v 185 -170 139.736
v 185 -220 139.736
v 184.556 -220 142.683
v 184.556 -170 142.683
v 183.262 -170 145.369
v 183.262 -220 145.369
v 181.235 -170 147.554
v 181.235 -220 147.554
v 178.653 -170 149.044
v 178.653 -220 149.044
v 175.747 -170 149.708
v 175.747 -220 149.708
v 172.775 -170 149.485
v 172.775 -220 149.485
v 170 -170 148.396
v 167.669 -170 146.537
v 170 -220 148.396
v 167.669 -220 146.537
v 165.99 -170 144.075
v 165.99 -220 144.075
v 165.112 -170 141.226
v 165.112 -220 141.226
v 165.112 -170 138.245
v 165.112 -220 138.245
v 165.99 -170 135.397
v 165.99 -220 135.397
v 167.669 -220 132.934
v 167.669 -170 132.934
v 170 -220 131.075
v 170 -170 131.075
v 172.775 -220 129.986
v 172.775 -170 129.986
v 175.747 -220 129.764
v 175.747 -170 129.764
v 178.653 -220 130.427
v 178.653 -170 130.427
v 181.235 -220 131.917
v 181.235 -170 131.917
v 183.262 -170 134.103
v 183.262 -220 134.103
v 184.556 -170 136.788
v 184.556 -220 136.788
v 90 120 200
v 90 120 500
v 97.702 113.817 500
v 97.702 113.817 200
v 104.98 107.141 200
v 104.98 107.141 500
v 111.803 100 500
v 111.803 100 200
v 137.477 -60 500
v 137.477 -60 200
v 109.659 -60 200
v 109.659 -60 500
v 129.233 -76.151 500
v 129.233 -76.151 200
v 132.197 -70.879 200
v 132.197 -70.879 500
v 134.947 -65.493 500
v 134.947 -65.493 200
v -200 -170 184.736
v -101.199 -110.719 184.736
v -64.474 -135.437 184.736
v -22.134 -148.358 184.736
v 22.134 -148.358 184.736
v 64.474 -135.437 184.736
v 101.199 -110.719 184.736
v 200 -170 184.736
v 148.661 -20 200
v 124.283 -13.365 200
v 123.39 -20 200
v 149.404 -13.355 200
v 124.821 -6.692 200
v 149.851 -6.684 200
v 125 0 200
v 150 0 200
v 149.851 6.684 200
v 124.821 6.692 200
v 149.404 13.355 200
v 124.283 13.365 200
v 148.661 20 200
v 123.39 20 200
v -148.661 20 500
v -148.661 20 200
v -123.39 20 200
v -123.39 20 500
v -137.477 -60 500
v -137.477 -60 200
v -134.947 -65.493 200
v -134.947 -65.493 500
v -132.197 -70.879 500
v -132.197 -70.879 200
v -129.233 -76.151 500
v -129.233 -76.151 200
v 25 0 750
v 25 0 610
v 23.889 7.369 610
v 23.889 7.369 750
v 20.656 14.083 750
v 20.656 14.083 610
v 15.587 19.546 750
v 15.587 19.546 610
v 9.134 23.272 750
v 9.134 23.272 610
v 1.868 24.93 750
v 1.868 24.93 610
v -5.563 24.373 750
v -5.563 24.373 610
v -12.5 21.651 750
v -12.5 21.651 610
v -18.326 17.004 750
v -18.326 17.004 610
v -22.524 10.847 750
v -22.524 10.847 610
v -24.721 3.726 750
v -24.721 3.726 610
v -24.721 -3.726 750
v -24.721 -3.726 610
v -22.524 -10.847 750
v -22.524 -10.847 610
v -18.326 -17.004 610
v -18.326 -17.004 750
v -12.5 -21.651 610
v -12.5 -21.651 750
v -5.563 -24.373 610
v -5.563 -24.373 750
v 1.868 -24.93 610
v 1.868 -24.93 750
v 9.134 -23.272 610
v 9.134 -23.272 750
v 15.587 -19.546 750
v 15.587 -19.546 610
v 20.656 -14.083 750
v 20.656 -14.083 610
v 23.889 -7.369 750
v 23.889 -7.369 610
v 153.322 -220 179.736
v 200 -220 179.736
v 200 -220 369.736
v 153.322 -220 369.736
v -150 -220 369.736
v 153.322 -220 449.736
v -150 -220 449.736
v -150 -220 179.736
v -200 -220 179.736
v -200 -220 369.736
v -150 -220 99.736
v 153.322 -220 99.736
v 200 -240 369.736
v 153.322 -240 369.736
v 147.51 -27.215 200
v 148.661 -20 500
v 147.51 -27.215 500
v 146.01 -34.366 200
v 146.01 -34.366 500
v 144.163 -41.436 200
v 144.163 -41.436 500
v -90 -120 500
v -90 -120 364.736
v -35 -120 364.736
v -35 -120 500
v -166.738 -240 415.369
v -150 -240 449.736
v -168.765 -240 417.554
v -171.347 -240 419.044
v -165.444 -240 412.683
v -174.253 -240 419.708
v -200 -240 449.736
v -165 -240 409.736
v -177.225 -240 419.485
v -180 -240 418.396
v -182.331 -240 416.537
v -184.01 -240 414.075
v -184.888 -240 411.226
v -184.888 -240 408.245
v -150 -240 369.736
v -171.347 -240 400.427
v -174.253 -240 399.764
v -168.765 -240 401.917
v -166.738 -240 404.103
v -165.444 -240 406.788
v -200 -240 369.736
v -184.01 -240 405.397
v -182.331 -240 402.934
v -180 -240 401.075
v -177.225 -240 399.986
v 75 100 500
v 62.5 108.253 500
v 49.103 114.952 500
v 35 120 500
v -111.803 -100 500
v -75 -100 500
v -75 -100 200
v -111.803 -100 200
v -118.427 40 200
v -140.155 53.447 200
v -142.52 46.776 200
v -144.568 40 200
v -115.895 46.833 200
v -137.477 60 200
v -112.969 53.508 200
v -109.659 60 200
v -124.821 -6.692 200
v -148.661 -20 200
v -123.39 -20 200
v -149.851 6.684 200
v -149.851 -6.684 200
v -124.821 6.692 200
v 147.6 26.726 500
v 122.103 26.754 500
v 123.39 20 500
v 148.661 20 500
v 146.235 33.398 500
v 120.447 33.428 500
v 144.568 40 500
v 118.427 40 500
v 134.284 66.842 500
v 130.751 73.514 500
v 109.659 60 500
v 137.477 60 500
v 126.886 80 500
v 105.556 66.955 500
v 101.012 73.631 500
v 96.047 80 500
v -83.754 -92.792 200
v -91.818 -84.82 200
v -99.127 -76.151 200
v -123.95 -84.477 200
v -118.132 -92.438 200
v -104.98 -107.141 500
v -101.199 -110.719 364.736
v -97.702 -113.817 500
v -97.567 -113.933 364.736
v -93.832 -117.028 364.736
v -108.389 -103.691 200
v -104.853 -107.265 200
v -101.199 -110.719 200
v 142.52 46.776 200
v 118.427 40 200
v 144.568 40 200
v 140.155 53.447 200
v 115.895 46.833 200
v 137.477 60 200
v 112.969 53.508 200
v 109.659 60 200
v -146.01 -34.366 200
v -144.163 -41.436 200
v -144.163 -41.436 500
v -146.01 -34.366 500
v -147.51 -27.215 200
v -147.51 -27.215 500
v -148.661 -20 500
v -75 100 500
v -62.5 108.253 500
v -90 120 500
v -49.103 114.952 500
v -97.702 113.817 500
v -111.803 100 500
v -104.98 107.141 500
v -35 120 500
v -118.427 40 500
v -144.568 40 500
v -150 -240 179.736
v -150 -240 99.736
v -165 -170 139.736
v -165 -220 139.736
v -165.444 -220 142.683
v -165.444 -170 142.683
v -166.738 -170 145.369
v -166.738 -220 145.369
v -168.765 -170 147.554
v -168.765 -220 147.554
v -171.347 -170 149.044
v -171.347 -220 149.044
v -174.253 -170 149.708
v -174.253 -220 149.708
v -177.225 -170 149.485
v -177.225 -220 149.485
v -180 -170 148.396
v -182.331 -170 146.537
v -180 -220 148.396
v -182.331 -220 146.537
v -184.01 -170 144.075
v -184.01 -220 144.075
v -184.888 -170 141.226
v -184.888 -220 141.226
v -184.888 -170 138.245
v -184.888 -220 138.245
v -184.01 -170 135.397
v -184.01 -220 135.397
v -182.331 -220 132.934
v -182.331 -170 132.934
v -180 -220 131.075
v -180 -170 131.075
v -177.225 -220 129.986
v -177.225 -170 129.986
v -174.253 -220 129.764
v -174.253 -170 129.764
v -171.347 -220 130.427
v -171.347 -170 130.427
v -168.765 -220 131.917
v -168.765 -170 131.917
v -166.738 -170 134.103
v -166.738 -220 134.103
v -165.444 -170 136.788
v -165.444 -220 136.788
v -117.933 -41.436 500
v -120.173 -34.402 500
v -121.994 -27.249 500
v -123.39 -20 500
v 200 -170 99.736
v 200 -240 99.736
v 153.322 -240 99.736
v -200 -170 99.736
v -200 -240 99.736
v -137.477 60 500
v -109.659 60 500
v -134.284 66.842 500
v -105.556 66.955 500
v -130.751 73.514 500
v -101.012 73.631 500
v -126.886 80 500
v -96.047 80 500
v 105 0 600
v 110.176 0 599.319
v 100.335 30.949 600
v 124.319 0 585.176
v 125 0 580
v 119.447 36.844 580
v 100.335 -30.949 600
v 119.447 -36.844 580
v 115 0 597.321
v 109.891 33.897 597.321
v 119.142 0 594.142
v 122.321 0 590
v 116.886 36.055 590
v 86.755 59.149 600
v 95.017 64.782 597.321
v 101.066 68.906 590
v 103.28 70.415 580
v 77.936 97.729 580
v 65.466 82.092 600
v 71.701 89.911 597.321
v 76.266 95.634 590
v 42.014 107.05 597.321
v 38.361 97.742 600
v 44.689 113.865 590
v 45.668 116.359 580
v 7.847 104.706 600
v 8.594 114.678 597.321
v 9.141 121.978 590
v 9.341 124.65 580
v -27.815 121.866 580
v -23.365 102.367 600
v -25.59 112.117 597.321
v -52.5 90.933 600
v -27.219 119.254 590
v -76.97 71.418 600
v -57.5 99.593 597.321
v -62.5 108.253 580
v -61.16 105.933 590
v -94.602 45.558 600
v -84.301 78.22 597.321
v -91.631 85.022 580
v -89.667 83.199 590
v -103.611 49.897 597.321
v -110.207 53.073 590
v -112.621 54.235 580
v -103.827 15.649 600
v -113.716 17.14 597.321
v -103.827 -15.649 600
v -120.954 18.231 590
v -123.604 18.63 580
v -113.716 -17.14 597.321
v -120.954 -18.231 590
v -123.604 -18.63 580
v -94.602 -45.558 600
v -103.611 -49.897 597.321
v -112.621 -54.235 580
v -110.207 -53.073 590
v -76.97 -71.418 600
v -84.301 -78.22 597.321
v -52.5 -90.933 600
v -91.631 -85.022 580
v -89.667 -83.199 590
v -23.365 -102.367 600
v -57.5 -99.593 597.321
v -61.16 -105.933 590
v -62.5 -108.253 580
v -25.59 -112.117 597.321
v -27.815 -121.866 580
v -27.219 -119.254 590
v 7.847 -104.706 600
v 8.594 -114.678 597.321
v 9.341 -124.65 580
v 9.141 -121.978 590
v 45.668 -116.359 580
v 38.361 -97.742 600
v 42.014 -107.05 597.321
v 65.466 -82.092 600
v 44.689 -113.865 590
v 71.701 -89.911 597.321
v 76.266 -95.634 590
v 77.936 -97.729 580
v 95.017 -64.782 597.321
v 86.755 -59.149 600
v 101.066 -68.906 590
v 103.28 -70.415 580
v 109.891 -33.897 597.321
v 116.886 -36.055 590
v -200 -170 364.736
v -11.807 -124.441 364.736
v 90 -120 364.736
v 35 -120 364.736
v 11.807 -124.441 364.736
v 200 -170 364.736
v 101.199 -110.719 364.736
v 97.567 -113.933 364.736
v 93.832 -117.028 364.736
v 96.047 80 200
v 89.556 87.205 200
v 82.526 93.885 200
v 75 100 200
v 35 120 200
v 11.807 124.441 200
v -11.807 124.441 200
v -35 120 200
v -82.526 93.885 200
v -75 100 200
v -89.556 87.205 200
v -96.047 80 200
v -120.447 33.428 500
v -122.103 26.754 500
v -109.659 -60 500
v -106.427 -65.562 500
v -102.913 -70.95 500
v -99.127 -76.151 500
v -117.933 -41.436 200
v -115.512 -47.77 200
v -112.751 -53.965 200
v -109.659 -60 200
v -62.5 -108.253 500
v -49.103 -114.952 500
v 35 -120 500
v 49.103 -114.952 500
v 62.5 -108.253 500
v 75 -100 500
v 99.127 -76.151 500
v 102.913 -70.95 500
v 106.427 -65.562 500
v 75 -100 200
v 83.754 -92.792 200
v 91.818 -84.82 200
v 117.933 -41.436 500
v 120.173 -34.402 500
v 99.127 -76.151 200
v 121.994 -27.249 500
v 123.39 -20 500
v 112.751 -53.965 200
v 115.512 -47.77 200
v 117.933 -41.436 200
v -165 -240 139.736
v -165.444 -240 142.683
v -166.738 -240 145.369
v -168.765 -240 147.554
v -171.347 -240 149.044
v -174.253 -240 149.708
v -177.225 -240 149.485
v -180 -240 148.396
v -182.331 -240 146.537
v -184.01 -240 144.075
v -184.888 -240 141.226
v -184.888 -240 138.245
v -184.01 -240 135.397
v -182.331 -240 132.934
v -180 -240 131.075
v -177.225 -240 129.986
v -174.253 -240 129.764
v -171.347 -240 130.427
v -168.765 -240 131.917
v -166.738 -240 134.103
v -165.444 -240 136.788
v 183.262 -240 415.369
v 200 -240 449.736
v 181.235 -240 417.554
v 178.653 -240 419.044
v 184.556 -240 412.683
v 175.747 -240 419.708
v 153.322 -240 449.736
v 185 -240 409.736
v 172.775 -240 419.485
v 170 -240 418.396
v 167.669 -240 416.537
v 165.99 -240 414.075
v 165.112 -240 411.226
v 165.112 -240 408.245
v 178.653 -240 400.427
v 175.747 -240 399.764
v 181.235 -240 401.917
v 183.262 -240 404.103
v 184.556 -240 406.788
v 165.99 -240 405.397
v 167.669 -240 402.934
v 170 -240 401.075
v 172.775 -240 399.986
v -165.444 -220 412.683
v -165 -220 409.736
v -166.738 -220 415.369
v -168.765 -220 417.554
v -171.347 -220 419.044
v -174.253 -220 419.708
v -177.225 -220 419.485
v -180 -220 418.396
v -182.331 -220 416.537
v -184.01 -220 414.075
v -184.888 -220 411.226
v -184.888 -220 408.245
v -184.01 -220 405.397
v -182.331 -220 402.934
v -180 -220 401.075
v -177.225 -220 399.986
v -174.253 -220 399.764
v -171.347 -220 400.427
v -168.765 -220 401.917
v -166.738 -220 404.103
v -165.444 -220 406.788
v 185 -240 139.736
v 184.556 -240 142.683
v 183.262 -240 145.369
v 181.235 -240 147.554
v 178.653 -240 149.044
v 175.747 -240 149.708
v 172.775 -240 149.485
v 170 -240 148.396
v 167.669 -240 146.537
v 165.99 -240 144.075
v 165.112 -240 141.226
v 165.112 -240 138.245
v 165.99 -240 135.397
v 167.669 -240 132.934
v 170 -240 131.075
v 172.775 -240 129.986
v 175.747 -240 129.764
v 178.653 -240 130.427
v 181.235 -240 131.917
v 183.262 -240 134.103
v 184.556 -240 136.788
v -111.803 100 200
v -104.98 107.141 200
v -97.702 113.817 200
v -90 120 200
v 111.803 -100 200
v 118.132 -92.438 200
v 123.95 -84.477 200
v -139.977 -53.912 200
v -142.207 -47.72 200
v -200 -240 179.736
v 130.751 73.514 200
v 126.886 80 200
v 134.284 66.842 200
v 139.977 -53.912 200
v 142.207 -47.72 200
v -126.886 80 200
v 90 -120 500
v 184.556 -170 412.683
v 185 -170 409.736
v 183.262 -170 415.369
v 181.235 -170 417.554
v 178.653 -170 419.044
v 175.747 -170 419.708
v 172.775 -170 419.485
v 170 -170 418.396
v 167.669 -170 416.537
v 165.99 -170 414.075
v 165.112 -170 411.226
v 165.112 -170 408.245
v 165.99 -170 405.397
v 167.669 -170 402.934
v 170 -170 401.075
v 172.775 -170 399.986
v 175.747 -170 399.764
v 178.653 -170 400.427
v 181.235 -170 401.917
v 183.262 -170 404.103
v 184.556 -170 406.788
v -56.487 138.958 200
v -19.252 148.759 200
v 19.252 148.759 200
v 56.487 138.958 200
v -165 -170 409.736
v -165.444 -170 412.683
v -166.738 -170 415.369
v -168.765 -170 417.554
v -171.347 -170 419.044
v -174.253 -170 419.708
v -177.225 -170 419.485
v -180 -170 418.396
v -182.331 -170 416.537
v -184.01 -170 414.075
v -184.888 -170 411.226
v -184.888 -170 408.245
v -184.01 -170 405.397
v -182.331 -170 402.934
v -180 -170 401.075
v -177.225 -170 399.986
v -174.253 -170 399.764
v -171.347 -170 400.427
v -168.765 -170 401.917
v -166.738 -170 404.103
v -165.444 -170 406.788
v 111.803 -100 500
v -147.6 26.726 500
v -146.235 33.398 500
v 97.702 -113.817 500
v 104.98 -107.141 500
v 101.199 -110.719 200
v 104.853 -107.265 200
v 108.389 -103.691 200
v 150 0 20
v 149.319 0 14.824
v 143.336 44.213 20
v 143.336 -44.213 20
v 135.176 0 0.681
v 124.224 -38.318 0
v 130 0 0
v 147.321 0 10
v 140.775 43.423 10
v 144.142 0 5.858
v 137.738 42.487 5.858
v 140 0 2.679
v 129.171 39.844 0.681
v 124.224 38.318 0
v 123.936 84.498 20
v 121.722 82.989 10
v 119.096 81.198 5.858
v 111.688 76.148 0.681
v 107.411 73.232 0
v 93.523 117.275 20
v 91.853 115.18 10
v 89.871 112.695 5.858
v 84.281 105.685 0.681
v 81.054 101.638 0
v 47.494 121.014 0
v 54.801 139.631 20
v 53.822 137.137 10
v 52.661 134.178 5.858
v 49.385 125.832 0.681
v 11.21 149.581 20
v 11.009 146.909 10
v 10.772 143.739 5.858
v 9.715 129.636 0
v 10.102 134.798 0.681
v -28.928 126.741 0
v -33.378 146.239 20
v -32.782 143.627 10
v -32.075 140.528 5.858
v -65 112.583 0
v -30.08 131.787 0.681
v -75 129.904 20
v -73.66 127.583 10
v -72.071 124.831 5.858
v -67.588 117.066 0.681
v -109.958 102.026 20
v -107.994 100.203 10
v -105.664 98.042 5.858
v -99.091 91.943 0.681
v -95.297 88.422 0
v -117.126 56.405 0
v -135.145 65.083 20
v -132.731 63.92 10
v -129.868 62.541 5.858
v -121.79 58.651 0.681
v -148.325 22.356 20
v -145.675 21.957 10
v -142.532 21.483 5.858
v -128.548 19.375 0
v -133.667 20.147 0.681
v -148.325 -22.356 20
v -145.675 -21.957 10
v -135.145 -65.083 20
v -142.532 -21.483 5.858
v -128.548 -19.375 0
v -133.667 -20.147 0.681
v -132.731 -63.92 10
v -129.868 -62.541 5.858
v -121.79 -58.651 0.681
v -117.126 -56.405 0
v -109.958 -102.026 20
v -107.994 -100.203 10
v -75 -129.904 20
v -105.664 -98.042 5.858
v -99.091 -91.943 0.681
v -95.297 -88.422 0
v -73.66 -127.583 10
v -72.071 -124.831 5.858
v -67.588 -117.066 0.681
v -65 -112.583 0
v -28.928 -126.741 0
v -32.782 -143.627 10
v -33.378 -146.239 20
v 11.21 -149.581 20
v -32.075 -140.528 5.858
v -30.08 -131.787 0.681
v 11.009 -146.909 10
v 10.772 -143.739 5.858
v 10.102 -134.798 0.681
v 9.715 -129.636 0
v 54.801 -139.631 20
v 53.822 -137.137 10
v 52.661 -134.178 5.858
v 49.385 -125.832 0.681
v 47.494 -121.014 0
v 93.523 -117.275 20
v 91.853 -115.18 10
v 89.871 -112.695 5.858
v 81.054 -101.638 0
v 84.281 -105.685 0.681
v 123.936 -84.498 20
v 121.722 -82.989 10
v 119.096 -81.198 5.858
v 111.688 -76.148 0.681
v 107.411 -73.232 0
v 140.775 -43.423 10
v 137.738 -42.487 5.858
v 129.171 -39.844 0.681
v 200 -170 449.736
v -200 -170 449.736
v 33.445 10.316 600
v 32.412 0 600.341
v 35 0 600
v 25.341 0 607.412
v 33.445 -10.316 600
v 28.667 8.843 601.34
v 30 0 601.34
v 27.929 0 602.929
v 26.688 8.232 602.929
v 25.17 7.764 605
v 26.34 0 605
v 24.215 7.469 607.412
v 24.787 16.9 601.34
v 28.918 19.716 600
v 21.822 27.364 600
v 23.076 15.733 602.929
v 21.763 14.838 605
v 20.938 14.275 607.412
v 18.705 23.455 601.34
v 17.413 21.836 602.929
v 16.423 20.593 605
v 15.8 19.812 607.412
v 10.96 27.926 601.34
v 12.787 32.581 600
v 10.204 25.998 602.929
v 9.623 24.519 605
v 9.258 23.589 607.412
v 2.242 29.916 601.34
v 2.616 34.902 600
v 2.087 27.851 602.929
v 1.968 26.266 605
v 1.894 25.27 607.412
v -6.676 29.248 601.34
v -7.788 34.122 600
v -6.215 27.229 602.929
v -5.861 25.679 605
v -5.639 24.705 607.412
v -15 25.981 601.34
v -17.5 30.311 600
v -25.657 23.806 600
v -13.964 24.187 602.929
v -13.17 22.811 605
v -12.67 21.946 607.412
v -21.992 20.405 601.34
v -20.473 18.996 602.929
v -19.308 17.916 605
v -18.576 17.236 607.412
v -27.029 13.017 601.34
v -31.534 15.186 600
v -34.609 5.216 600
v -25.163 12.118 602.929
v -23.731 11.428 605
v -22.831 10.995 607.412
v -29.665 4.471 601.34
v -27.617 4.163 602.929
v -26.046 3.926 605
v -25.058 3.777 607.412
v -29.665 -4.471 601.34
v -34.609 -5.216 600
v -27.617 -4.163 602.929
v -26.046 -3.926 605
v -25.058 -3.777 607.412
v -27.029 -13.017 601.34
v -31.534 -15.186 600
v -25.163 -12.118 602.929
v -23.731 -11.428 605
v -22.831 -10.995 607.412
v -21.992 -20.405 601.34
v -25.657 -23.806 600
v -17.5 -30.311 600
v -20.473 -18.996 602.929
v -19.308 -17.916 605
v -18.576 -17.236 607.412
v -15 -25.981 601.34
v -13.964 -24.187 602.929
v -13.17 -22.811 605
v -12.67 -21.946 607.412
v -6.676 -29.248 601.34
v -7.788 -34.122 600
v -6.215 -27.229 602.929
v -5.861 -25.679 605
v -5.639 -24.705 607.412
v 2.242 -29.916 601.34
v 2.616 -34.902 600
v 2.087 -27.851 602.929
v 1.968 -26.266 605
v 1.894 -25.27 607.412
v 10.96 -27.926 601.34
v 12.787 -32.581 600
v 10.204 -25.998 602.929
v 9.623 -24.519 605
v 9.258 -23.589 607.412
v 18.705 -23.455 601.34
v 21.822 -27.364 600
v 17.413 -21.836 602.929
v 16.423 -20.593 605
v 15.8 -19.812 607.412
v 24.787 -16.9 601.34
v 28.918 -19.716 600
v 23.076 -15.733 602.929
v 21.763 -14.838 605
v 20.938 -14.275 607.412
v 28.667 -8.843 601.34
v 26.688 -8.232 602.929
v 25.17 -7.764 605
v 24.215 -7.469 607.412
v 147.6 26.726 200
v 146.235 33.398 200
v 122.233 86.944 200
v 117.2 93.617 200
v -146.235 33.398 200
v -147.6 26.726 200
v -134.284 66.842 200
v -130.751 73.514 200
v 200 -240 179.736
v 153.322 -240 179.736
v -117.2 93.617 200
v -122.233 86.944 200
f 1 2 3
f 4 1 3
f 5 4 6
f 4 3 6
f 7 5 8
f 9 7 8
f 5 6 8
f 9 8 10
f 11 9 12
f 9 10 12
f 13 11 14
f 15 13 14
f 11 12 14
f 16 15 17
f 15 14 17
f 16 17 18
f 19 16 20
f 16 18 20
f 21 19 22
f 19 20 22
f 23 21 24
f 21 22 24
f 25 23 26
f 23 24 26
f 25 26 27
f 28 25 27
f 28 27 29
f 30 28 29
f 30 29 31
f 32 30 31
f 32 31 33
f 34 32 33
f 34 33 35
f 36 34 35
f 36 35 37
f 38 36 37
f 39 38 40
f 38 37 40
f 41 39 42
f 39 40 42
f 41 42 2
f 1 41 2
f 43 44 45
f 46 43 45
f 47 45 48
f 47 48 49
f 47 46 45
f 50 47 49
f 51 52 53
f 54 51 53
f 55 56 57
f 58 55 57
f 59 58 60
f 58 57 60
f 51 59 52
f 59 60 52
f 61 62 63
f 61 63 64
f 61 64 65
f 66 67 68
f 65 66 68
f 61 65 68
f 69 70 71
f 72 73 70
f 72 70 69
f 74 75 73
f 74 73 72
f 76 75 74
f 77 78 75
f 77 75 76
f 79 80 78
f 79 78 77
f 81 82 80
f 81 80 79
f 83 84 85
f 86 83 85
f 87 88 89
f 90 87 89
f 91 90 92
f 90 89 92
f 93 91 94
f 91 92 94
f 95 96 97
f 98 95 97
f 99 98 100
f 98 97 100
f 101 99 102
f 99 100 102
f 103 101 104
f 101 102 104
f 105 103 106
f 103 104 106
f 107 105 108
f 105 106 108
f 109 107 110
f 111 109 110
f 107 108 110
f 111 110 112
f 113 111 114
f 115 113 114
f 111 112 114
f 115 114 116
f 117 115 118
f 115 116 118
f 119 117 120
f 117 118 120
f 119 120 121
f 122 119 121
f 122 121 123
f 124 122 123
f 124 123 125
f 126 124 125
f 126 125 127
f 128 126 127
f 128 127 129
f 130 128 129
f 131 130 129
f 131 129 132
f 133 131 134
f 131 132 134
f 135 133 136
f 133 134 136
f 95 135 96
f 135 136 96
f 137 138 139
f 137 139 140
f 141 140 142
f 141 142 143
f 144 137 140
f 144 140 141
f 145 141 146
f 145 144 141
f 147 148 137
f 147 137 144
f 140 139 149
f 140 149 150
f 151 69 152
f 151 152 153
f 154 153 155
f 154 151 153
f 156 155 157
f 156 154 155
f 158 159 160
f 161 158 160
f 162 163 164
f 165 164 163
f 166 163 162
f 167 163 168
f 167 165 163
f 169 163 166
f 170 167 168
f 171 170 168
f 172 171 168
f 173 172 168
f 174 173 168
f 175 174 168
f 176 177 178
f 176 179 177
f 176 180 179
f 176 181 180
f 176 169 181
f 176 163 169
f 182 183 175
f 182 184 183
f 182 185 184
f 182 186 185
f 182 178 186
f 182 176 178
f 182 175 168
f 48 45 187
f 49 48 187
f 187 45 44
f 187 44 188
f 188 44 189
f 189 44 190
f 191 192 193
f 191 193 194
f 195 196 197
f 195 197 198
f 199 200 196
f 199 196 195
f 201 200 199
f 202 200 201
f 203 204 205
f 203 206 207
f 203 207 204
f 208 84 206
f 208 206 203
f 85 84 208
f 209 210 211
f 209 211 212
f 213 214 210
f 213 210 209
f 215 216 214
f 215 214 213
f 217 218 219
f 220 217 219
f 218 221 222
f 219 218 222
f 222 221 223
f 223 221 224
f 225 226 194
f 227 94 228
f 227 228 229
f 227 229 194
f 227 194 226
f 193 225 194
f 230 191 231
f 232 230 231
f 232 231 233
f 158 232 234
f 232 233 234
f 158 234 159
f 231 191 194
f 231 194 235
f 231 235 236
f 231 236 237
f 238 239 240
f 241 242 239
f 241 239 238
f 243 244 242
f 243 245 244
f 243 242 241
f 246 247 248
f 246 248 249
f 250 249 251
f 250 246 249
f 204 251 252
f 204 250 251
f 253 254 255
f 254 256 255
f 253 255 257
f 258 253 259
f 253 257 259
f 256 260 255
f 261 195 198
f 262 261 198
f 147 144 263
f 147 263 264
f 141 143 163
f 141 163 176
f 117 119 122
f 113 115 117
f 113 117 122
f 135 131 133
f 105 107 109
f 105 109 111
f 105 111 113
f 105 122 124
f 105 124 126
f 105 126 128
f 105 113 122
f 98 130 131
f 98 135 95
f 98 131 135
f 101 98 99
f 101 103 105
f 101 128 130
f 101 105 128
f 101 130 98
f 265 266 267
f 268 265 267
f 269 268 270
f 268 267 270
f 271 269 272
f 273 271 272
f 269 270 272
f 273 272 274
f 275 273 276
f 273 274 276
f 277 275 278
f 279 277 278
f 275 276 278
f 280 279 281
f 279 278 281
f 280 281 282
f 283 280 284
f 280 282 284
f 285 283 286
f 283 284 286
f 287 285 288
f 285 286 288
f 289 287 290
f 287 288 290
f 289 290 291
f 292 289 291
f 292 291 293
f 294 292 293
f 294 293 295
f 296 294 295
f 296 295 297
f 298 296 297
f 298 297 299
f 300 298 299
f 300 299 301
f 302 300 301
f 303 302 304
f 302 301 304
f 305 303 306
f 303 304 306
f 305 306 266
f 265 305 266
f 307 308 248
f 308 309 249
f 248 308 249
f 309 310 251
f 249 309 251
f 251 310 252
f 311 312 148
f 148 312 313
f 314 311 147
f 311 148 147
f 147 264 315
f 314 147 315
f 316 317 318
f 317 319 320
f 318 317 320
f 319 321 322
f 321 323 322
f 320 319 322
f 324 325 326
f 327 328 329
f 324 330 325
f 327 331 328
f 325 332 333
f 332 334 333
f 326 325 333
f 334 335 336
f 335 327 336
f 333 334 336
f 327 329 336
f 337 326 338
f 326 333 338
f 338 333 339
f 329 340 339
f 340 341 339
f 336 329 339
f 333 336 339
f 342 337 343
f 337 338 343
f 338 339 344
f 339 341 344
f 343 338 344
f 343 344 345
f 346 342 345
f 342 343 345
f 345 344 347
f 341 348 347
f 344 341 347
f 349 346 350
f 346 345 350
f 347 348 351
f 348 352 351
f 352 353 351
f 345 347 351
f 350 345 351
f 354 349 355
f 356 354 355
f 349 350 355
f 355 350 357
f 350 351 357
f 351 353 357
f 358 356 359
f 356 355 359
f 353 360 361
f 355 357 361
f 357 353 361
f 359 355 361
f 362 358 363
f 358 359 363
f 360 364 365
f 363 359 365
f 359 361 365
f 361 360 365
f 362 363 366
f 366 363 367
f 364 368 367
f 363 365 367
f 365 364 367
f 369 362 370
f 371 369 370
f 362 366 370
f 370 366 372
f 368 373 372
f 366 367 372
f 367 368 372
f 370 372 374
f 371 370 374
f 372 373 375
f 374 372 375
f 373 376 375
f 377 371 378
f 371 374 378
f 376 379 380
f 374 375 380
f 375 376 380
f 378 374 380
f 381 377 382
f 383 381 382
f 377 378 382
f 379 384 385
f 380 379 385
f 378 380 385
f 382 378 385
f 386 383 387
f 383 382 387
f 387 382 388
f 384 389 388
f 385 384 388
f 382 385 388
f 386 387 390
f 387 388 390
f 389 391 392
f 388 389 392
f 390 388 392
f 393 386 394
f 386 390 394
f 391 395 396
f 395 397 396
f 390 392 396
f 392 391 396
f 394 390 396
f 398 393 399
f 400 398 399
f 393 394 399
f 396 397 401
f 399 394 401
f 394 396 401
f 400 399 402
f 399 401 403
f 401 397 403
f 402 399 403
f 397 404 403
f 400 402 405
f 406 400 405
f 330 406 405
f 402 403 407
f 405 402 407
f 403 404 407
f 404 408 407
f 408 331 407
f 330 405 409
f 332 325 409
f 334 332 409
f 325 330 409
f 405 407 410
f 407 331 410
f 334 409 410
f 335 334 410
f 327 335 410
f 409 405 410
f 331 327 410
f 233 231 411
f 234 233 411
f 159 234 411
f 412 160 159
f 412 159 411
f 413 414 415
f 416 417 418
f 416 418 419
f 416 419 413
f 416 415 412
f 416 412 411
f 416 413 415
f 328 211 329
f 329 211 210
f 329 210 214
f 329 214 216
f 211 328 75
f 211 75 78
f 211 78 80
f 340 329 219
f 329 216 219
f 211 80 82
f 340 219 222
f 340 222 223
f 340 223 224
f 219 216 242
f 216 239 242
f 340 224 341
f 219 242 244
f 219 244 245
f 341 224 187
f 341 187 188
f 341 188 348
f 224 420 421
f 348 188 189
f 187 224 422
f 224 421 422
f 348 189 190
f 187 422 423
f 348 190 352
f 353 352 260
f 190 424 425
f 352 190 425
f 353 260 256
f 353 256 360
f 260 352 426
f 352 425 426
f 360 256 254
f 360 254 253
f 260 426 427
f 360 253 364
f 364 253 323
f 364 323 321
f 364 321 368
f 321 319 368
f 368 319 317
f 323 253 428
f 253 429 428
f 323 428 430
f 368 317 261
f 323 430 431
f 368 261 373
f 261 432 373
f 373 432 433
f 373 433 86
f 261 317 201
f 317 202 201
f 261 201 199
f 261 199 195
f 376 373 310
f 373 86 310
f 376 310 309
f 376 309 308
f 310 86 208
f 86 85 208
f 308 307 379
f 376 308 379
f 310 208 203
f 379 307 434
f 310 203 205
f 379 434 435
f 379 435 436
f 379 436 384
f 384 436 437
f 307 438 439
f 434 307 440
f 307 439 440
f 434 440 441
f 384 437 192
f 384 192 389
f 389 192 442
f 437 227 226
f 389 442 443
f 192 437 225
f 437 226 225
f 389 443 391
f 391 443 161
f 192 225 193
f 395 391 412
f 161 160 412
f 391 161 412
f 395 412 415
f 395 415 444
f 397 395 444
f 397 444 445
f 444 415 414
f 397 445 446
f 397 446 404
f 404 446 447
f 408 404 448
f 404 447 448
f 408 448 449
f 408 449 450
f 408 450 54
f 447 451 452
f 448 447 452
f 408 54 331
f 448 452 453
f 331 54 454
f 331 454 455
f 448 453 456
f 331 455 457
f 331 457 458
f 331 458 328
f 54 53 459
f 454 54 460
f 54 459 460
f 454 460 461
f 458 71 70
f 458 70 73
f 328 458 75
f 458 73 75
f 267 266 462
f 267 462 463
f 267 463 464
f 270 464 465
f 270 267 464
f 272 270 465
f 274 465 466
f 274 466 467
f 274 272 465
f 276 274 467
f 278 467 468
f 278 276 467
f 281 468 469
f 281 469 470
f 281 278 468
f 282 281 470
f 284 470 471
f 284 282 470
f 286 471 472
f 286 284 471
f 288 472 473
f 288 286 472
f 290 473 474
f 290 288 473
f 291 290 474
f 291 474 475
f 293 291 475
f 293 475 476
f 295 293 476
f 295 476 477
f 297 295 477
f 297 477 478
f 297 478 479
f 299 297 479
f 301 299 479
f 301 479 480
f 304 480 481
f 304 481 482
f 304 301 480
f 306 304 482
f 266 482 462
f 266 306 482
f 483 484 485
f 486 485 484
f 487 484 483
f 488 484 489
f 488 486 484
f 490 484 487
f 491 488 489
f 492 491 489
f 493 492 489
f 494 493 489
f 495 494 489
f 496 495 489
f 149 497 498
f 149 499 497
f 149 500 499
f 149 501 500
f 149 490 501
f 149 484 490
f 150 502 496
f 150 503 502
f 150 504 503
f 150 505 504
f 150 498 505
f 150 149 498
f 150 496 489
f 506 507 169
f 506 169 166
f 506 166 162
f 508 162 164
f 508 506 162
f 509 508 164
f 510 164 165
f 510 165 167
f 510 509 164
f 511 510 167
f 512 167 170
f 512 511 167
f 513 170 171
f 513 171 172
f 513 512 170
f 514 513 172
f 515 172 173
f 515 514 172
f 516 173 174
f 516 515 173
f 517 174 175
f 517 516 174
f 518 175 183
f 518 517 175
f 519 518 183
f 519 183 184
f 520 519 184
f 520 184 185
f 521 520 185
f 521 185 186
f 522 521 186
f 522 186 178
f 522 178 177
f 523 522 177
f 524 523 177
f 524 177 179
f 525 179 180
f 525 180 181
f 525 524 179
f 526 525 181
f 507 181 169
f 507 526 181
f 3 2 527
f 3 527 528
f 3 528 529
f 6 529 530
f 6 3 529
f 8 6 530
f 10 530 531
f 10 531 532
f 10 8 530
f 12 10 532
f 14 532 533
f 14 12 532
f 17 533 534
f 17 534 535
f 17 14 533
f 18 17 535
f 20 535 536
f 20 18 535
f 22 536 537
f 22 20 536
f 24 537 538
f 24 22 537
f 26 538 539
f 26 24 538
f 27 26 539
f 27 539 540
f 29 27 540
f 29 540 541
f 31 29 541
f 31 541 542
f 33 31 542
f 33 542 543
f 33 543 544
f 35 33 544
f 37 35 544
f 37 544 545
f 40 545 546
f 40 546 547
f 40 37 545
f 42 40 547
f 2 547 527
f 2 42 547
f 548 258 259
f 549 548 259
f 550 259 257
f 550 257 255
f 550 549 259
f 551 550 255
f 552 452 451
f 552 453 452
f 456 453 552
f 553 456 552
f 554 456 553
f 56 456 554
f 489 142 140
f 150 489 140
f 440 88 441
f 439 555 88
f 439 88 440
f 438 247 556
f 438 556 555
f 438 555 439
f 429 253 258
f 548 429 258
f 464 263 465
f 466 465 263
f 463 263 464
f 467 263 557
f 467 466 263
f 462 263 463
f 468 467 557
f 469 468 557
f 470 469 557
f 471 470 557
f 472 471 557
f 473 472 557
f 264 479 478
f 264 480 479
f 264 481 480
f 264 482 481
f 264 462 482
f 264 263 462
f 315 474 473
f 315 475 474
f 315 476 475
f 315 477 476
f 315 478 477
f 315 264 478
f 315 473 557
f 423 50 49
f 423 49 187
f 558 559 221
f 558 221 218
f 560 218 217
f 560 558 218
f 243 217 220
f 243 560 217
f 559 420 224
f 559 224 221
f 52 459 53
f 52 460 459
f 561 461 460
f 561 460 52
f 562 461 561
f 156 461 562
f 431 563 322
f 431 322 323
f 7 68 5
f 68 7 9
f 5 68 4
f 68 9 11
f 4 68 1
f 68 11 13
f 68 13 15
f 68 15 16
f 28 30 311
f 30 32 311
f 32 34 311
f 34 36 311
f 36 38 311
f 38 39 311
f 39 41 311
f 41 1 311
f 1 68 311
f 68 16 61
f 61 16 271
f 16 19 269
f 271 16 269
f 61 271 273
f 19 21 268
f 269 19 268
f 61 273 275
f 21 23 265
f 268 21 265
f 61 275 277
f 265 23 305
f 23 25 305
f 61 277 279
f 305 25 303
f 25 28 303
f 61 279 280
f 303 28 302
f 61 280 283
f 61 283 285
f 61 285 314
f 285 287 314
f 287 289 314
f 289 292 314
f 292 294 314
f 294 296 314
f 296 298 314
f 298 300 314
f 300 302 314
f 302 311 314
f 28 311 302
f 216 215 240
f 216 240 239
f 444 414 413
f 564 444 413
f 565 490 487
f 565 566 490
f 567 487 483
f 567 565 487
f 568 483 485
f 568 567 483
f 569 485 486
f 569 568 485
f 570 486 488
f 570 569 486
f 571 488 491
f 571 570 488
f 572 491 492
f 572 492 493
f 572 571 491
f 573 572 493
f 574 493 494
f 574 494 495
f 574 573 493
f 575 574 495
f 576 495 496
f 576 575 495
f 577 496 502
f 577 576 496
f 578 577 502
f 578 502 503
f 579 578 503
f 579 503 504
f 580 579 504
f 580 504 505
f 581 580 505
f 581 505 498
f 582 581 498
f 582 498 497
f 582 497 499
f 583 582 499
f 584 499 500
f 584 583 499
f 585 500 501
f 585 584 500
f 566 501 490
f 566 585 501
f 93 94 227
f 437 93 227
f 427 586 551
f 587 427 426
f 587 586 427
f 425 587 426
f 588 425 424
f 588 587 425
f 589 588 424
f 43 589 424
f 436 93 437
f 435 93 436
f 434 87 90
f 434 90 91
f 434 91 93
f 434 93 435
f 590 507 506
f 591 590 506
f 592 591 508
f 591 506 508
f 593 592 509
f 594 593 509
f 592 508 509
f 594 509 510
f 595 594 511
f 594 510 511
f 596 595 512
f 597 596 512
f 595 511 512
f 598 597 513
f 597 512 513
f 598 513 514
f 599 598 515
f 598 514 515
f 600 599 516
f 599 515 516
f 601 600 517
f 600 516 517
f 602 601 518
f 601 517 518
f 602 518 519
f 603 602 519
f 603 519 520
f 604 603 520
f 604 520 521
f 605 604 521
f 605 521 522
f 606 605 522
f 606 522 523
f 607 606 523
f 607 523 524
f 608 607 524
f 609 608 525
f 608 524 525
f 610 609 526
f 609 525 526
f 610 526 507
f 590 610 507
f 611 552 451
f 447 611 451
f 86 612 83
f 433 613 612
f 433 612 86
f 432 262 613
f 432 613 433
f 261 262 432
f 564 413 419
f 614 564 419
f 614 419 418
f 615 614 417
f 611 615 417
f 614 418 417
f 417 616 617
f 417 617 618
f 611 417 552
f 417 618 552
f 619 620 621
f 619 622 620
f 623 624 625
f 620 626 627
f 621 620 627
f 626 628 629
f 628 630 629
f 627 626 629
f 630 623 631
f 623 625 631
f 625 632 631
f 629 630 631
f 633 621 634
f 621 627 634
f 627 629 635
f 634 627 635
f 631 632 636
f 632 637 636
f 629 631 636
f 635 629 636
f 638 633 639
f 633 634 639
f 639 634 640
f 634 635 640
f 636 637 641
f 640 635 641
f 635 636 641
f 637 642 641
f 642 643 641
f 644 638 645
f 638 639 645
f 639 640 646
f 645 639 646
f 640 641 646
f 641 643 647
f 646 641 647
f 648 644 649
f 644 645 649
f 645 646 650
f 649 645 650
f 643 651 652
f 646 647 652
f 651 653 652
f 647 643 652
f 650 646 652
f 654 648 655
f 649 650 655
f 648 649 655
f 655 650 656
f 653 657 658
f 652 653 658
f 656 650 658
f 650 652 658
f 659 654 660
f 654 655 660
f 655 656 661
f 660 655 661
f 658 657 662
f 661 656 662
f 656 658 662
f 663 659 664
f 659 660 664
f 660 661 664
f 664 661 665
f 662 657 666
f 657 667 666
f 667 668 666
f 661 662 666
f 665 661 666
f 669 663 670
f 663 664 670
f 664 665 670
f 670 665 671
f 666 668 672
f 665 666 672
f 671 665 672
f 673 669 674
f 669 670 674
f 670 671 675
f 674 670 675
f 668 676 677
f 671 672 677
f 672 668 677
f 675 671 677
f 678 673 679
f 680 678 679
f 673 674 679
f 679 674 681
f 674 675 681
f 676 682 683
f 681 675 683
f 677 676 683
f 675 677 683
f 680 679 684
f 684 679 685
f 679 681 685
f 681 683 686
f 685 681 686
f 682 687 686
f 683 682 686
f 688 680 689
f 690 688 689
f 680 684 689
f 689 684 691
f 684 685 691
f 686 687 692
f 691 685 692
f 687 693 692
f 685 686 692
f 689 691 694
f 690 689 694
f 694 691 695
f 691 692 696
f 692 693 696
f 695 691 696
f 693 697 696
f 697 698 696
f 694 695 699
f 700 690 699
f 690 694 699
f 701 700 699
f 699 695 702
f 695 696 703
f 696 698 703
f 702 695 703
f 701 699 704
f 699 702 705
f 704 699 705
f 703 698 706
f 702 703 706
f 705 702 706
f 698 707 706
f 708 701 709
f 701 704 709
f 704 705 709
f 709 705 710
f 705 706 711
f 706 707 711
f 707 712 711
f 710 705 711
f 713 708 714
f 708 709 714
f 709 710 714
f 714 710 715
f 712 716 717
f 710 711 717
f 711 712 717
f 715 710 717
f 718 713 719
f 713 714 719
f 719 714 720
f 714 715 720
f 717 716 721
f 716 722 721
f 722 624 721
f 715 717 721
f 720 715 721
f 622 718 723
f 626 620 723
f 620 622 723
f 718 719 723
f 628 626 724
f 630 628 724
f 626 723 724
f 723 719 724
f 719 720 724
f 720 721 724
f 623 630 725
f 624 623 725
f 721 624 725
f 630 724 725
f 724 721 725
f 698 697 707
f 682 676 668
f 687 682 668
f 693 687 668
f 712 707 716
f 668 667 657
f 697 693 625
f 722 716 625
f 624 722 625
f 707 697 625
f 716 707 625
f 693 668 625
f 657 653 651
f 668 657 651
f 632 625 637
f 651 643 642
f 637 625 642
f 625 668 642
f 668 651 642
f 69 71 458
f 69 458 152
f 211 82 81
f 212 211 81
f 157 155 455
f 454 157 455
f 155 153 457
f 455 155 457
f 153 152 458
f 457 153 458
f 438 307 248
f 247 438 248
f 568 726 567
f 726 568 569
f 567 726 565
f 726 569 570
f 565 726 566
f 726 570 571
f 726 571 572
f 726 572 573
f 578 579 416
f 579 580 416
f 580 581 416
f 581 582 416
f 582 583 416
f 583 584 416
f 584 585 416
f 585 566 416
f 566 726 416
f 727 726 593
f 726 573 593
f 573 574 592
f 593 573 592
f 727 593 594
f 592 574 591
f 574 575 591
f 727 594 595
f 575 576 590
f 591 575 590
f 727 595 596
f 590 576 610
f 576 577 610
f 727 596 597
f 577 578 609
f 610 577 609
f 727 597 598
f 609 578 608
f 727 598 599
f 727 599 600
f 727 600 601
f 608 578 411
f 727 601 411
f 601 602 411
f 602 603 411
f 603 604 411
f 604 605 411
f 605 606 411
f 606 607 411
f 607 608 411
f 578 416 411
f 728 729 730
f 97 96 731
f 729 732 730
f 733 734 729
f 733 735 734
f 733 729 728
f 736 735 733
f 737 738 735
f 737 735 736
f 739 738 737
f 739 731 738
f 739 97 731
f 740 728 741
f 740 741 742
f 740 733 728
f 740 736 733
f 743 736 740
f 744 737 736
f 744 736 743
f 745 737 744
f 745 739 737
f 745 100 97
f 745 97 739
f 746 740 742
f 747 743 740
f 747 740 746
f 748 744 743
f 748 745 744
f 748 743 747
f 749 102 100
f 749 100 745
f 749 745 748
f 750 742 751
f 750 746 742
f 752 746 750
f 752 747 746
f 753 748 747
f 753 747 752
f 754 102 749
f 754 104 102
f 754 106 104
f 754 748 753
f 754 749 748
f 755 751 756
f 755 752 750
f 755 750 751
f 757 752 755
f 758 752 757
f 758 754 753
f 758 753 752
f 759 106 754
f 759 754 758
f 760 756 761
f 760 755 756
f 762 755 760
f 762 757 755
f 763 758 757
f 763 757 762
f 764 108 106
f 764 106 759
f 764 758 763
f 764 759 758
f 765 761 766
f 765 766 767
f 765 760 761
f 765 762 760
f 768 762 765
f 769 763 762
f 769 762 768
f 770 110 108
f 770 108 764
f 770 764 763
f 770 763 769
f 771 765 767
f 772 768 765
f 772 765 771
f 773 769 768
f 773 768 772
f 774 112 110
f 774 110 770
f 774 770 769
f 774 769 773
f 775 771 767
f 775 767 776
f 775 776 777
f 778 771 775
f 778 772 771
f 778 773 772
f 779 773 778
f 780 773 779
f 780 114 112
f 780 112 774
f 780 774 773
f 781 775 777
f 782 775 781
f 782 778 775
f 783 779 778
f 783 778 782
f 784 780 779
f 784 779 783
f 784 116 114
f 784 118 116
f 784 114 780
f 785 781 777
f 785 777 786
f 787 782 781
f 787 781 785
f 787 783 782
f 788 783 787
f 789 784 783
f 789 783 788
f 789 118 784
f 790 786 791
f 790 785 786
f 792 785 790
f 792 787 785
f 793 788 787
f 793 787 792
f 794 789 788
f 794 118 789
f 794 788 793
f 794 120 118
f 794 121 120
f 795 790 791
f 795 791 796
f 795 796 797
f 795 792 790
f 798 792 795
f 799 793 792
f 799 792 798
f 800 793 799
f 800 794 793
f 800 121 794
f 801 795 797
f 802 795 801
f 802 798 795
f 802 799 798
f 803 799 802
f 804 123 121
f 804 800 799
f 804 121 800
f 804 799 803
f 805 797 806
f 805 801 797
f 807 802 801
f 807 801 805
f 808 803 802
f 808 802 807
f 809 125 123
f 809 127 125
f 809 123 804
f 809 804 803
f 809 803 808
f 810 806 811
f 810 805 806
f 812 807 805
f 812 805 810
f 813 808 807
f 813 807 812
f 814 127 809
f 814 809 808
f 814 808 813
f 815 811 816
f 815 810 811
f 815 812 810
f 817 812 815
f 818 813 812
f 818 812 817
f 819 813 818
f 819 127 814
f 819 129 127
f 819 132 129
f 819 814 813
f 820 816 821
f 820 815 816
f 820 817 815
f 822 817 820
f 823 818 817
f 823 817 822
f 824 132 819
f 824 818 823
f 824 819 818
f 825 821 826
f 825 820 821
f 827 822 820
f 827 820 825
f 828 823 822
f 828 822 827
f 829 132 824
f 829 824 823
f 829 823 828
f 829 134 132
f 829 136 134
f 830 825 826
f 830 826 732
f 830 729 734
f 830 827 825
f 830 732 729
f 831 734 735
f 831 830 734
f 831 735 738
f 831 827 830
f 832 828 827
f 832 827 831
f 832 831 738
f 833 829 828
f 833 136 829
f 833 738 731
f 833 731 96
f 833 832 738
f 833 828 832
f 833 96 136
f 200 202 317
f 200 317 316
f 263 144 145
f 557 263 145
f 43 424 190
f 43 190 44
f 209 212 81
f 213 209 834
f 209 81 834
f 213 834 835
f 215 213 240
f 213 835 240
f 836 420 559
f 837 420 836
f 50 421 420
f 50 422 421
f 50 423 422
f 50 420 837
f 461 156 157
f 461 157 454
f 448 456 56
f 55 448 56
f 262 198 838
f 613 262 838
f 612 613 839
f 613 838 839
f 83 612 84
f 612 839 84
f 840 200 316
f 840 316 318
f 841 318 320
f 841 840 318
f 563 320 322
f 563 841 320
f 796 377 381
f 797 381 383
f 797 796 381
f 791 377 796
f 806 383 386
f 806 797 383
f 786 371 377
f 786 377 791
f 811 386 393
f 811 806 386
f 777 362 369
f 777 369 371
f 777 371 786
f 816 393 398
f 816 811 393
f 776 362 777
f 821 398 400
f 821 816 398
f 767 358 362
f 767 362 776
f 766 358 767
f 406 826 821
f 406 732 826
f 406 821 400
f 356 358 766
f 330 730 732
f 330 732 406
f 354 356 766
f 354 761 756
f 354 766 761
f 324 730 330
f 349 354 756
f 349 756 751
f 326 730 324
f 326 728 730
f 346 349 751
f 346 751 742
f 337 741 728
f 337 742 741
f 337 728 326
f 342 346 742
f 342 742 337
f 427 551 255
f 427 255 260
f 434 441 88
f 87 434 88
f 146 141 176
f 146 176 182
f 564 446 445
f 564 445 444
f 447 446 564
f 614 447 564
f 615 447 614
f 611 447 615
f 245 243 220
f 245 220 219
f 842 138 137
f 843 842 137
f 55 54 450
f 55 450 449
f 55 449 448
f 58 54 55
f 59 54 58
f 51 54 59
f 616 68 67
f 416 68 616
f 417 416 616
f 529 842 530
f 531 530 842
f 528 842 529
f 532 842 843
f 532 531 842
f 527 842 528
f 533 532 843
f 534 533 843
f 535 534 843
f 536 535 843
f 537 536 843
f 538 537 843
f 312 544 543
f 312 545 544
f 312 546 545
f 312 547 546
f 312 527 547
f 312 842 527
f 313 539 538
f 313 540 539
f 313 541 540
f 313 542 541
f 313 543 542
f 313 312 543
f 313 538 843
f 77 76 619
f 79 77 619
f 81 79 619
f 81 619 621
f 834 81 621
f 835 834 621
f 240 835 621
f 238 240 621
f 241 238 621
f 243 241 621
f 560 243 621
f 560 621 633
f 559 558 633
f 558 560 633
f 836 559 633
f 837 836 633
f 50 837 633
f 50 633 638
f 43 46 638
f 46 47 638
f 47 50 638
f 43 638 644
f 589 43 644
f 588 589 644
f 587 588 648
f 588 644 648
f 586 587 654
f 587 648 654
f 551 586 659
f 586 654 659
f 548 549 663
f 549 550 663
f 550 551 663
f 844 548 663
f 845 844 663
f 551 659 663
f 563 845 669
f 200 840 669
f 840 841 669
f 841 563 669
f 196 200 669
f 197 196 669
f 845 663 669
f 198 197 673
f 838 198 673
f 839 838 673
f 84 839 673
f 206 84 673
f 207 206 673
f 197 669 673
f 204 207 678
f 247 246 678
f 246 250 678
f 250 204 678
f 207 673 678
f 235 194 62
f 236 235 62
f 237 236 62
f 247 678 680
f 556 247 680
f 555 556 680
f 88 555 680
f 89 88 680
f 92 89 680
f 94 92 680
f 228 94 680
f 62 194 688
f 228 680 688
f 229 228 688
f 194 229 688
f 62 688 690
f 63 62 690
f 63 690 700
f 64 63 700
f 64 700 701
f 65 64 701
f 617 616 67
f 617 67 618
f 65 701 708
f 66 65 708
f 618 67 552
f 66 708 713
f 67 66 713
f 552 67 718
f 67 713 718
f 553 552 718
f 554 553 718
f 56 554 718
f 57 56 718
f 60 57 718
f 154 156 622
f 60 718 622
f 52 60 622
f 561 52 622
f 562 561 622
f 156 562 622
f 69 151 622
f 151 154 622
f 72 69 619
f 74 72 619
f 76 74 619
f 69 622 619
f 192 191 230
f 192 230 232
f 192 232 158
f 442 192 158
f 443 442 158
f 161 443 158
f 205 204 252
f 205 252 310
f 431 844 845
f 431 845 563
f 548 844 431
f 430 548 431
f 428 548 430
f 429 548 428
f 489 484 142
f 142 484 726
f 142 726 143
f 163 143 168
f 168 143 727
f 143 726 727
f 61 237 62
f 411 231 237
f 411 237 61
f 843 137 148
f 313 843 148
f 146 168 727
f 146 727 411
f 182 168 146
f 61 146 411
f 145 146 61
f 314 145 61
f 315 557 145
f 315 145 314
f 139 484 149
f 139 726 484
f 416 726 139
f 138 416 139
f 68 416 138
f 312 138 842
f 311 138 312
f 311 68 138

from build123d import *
from build123d.topology import SkipClean

# Parameters (mm, degrees)
SKETCH1_R            = 150
BOSS_EXTRUDE1_DEPTH  = 200
BOSS_EXTRUDE11_DEPTH = 300
BOSS_EXTRUDE14_START = -300
SKETCH12_R           = 125
BOSS_EXTRUDE14_DEPTH = 400
SKETCH13_W           = 400
SKETCH13_H           = 350
SKETCH13_R           = 10
BOSS_EXTRUDE15_DEPTH = 50
SKETCH13_3_W         = 46.677917496
SKETCH13_3_H         = 80
SKETCH13_3_R         = 10
SKETCH13_3_W_2       = 50
BOSS_EXTRUDE16_DEPTH = 20
BOSS_EXTRUDE17_DEPTH = 90
SKETCH16_R           = 25
BOSS_EXTRUDE18_DEPTH = 150
FILLET2_R            = 10
FILLET3_R            = 20


with BuildPart() as part:
    # Sketch1 → Boss-Extrude1 (new body)
    with BuildSketch(Plane.XY):
        Circle(SKETCH1_R)
    extrude(amount=BOSS_EXTRUDE1_DEPTH)

    # Sketch7 → Boss-Extrude11 (add)
    with SkipClean():  # the faces are left unmerged after this step: merging them gives an invalid solid
        with BuildSketch(Plane.XY.offset(200)):
            with BuildLine():
                Line((-90, 120), (90, 120))
                ThreePointArc((90, 120), (101.396020382, 110.538893837), (111.803398875, 100))
                Line((111.803398875, 100), (-111.803398875, 100))
                ThreePointArc((-111.803398875, 100), (-101.396020382, 110.538893837), (-90, 120))
            make_face()
            with BuildLine():
                Line((-126.885775404, 80), (126.885775404, 80))
                ThreePointArc((126.885775404, 80), (132.559251115, 70.200035213), (137.477270849, 60))
                Line((137.477270849, 60), (-137.477270849, 60))
                ThreePointArc((-137.477270849, 60), (-132.559251115, 70.200035213), (-126.885775404, 80))
            make_face()
            with BuildLine():
                Line((144.16342013, -41.435592144), (-144.16342013, -41.435592144))
                ThreePointArc((-144.16342013, -41.435592144), (-146.803816882, -30.799989431), (-148.660687473, -20))
                Line((-148.660687473, -20), (148.660687473, -20))
                ThreePointArc((148.660687473, -20), (146.803816882, -30.799989431), (144.16342013, -41.435592144))
            make_face()
            with BuildLine():
                Line((111.803398875, -100), (-111.803398875, -100))
                ThreePointArc((-111.803398875, -100), (-101.396020382, -110.538893837), (-90, -120))
                Line((-90, -120), (90, -120))
                ThreePointArc((90, -120), (101.396020382, -110.538893837), (111.803398875, -100))
            make_face()
            with BuildLine():
                Line((144.568322948, 40), (-144.568322948, 40))
                ThreePointArc((-144.568322948, 40), (-146.955139883, 30.069700063), (-148.660687473, 20))
                Line((-148.660687473, 20), (148.660687473, 20))
                ThreePointArc((148.660687473, 20), (146.955139883, 30.069700063), (144.568322948, 40))
            make_face()
            with BuildLine():
                Line((137.477270849, -60), (-137.477270849, -60))
                ThreePointArc((-137.477270849, -60), (-133.599215205, -68.20007109), (-129.232599216, -76.150740639))
                Line((-129.232599216, -76.150740639), (129.232599216, -76.150740639))
                ThreePointArc((129.232599216, -76.150740639), (133.599215205, -68.20007109), (137.477270849, -60))
            make_face()
        extrude(amount=BOSS_EXTRUDE11_DEPTH)



with BuildPart() as body_2:
    # Sketch12 → Boss-Extrude14 (new body)
    with BuildSketch(Plane.XY.offset(500).offset(BOSS_EXTRUDE14_START)):
        Circle(SKETCH12_R)
    extrude(amount=BOSS_EXTRUDE14_DEPTH)


with BuildPart() as body_3:
    # Sketch13 → Boss-Extrude15 (new body)
    with BuildSketch(Plane(origin=(0, -220, 0), x_dir=(-1, 0, 0), z_dir=(0, -1, 0))):
        with Locations((0, -274.735715433)):
            Rectangle(SKETCH13_W, SKETCH13_H)
        with Locations(Location((-175, -139.735715433, 0), (0, 0, 180))):
            Circle(SKETCH13_R, mode=Mode.SUBTRACT)
        with Locations(Location((-175, -409.735715433, 0), (0, 0, 180))):
            Circle(SKETCH13_R, mode=Mode.SUBTRACT)
        with Locations(Location((175, -409.735715433, 0), (0, 0, 180))):
            Circle(SKETCH13_R, mode=Mode.SUBTRACT)
        with Locations(Location((175, -139.735715433, 0), (0, 0, 180))):
            Circle(SKETCH13_R, mode=Mode.SUBTRACT)
    extrude(amount=-BOSS_EXTRUDE15_DEPTH)

    # Sketch13<3> → Boss-Extrude16 (add)
    # profile 1 of 4: a face of its own
    with BuildSketch(Plane(origin=(0, -220, 0), x_dir=(-1, 0, 0), z_dir=(0, -1, 0))):
        with Locations((-176.661041252, -409.735715433)):
            Rectangle(SKETCH13_3_W, SKETCH13_3_H)
        with Locations(Location((-175, -409.735715433, 0), (0, 0, 180))):
            Circle(SKETCH13_3_R, mode=Mode.SUBTRACT)
    # profile 2 of 4: a face of its own
    with BuildSketch(Plane(origin=(0, -220, 0), x_dir=(-1, 0, 0), z_dir=(0, -1, 0))):
        with Locations((-176.661041252, -139.735715433)):
            Rectangle(SKETCH13_3_W, SKETCH13_3_H)
        with Locations(Location((-175, -139.735715433, 0), (0, 0, 180))):
            Circle(SKETCH13_3_R, mode=Mode.SUBTRACT)
    # profile 3 of 4: a face of its own
    with BuildSketch(Plane(origin=(0, -220, 0), x_dir=(-1, 0, 0), z_dir=(0, -1, 0))):
        with Locations((175, -409.735715433)):
            Rectangle(SKETCH13_3_W_2, SKETCH13_3_H)
        with Locations(Location((175, -409.735715433, 0), (0, 0, 180))):
            Circle(SKETCH13_3_R, mode=Mode.SUBTRACT)
    # profile 4 of 4: a face of its own
    with BuildSketch(Plane(origin=(0, -220, 0), x_dir=(-1, 0, 0), z_dir=(0, -1, 0))):
        with Locations((175, -139.735715433)):
            Rectangle(SKETCH13_3_W_2, SKETCH13_3_H)
        with Locations(Location((175, -139.735715433, 0), (0, 0, 180))):
            Circle(SKETCH13_3_R, mode=Mode.SUBTRACT)
    extrude(amount=BOSS_EXTRUDE16_DEPTH)


with BuildPart() as part_1:
    with SkipClean():  # the faces are left unmerged after this step: merging them gives an invalid solid
        add(part.part)

        add(body_2.part)  # Boss-Extrude17 merges body 2

        add(body_3.part)  # Boss-Extrude17 merges body 3
        # Sketch14 → Boss-Extrude17 (add, symmetric)
        with BuildSketch(Plane.XY.offset(274.735715433)):
            Polygon((-200, -170), (200, -170), (100, -110), (-100, -110), align=None)
        extrude(amount=BOSS_EXTRUDE17_DEPTH, both=True)

    # Sketch16 → Boss-Extrude18 (add)
    with BuildSketch(Plane.XY.offset(600)):
        Circle(SKETCH16_R)
    extrude(amount=BOSS_EXTRUDE18_DEPTH)

    # Fillet2
    fillet2_edges = [part_1.edges().sort_by_distance(p)[0] for p in [
        (-25, 0, 600),
    ]]
    fillet(fillet2_edges, radius=FILLET2_R)

    # Fillet3
    fillet3_edges = [part_1.edges().sort_by_distance(p)[0] for p in [
        (-125, 0, 600),
        (-150, 0, 0),
    ]]
    fillet(fillet3_edges, radius=FILLET3_R)


solid = part_1.part
